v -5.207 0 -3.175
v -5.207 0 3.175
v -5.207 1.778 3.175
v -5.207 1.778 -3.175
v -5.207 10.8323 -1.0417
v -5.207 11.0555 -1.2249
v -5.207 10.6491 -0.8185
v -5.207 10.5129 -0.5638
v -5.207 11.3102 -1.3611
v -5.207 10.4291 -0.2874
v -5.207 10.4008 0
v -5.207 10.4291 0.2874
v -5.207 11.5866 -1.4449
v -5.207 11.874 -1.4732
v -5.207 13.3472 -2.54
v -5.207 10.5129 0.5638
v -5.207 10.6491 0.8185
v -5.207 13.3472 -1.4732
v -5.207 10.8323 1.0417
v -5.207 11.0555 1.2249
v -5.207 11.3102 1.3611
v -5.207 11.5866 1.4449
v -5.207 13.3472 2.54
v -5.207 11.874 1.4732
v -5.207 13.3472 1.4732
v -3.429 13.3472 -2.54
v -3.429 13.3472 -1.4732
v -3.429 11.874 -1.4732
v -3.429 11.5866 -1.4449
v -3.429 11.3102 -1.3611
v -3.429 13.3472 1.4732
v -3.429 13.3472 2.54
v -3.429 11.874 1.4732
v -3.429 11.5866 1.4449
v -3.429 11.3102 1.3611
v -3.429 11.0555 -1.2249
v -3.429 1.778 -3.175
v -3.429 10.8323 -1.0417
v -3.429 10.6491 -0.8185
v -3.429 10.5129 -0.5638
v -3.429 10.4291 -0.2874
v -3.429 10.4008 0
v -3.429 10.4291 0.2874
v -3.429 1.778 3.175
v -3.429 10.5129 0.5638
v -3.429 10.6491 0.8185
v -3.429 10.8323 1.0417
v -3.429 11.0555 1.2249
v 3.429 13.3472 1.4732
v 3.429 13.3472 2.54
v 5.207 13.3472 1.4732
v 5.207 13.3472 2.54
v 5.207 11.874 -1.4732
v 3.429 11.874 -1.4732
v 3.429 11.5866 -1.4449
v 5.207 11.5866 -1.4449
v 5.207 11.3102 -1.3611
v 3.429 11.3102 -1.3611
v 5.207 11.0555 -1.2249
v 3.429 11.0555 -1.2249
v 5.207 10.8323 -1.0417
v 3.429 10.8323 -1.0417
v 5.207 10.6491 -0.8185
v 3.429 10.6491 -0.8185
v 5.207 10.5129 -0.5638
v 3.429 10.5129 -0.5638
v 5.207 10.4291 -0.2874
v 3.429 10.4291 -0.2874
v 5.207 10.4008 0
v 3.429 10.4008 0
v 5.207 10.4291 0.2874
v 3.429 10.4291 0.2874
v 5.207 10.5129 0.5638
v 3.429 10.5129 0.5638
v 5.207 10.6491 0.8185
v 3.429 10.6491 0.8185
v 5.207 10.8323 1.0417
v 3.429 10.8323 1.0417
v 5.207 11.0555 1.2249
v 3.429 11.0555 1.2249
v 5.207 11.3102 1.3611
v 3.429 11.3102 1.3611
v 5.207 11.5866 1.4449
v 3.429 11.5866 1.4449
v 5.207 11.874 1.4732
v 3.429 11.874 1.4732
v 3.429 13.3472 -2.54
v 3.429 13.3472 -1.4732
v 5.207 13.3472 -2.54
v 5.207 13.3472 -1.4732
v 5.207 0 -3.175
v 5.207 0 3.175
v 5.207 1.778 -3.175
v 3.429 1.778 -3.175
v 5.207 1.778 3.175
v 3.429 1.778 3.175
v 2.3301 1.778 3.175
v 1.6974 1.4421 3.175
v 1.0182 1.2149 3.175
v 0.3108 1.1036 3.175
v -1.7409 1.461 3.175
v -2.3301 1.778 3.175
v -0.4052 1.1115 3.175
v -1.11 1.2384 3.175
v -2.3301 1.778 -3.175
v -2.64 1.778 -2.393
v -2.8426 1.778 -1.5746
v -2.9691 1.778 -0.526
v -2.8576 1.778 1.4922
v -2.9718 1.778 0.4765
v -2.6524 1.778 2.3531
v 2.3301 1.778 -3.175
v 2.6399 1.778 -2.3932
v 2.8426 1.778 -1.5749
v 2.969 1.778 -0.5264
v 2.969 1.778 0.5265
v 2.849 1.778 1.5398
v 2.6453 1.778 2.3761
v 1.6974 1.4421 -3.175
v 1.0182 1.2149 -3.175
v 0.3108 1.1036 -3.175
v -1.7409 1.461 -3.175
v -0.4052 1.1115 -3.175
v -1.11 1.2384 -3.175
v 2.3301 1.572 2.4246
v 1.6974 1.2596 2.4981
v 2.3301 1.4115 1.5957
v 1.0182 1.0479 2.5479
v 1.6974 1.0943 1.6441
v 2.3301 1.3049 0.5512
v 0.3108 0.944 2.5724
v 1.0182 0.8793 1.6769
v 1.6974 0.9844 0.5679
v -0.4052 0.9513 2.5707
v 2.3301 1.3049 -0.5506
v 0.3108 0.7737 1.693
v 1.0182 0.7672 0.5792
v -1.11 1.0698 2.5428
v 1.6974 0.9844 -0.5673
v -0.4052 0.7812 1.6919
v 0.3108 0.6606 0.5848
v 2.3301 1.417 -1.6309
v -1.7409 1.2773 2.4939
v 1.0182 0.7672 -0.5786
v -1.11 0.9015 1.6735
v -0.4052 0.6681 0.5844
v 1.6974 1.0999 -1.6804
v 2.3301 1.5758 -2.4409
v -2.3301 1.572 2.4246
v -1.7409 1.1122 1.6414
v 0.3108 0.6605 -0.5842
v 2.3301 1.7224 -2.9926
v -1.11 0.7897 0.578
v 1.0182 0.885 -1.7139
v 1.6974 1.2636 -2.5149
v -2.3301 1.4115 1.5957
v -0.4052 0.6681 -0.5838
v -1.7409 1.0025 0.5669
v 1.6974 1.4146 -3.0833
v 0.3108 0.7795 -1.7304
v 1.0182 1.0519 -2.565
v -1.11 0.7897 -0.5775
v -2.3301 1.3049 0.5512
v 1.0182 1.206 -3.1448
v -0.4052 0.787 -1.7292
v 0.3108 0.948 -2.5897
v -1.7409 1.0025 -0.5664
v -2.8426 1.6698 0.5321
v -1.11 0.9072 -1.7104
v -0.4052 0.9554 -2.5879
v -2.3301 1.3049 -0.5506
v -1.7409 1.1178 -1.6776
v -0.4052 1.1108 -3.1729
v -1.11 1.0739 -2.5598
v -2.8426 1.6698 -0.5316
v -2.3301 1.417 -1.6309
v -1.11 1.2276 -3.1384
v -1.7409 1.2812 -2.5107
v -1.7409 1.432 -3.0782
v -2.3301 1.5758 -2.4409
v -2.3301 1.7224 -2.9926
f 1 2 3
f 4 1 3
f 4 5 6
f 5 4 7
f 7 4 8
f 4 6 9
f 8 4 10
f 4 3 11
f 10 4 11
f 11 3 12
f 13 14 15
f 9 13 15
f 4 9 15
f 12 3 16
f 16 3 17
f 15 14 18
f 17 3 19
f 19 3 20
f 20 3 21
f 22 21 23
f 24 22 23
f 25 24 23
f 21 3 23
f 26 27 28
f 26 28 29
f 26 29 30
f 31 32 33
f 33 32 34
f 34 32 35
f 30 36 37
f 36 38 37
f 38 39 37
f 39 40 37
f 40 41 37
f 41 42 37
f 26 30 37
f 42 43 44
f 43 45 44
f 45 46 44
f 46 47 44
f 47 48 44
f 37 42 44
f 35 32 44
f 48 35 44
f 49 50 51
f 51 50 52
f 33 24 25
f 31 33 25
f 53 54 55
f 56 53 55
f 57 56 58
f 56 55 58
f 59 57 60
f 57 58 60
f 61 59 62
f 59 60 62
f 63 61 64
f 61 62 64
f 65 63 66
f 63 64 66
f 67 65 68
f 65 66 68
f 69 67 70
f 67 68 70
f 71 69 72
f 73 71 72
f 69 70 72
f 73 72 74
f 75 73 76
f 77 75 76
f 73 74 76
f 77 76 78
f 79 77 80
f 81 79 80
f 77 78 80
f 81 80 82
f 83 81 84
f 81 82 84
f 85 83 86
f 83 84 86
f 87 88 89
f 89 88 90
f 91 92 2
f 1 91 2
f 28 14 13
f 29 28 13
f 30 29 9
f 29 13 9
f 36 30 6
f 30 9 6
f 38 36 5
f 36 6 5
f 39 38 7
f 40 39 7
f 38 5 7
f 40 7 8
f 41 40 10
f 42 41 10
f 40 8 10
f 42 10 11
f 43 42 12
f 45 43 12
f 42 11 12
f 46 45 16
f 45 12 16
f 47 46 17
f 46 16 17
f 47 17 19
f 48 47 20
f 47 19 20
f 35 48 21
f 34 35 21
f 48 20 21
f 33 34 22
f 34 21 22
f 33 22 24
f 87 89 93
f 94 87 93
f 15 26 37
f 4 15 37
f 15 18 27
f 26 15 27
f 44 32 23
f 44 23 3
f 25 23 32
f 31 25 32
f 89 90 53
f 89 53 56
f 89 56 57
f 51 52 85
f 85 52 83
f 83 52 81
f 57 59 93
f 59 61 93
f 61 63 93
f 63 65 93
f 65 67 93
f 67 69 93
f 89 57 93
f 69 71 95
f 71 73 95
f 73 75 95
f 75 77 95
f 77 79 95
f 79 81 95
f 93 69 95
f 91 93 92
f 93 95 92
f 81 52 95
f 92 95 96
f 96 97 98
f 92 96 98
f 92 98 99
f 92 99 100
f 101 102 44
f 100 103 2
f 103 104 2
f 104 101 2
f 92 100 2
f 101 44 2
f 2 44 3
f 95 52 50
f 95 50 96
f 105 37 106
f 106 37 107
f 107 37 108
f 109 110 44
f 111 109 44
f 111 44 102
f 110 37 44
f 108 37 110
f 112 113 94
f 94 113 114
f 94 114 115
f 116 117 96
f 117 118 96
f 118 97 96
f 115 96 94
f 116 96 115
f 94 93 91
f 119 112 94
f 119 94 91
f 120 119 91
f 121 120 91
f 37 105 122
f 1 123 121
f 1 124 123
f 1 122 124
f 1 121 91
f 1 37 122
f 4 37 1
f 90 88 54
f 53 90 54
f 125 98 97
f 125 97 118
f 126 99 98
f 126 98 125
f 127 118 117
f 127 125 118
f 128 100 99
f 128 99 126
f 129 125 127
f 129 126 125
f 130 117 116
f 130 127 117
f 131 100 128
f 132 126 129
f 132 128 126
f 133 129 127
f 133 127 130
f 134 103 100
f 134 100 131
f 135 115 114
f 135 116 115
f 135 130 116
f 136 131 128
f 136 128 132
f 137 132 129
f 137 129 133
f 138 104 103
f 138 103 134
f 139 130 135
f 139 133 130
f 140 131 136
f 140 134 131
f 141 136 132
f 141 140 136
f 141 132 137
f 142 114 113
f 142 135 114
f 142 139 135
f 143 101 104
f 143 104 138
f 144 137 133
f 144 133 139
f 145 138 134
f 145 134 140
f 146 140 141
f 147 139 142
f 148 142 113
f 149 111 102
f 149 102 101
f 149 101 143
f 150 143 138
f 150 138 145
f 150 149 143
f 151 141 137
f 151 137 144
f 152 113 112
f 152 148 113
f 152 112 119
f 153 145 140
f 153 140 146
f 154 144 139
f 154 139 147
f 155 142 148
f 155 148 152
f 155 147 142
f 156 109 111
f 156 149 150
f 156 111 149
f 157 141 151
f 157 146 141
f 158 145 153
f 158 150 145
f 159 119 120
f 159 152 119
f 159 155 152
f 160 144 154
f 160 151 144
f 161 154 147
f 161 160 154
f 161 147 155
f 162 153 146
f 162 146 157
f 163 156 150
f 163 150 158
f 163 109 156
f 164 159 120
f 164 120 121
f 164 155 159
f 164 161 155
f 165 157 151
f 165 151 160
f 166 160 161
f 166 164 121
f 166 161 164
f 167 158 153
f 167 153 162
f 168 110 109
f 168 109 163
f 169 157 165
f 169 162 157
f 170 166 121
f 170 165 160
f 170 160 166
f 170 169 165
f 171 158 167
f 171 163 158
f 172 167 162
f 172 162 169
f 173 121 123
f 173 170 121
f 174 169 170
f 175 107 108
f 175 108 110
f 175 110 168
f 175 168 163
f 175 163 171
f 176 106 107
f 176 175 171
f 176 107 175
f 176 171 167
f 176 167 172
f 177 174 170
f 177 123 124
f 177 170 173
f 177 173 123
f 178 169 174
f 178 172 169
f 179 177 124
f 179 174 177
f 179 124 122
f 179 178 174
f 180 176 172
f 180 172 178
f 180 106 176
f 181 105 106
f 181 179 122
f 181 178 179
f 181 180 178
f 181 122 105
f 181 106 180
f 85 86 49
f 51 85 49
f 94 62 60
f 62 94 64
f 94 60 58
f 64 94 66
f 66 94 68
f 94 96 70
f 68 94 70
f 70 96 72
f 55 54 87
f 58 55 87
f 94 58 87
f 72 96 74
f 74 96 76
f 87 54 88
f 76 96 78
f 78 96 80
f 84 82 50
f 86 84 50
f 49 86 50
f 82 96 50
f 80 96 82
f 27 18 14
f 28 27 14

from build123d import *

# Parameters (mm, degrees)
BOSS_EXTRUDE1_DEPTH     = 3.175
CUT_EXTRUDE1_DEPTH      = 15.674509254
CUT_EXTRUDE1_DEPTH_BACK = 15.674509254
CUT_EXTRUDE2_DEPTH      = 15.674509254


with BuildPart() as part:
    # Sketch1 → Boss-Extrude1 (new, symmetric)
    with BuildSketch(Plane.XY):
        Polygon((5.207, 0), (-5.207, 0), (-5.207, 13.3472), (-3.429, 13.3472), (-3.429, 1.778), (3.429, 1.778), (3.429, 13.3472), (5.207, 13.3472), align=None)
    extrude(amount=BOSS_EXTRUDE1_DEPTH, both=True)

    # Sketch2 → Cut-Extrude1 (cut, two sides: drawn at the far end of the back side and taken through both)
    with BuildSketch(Plane(origin=(0, 0, 0), x_dir=(0, 0, -1), z_dir=(1, 0, 0)).offset(-CUT_EXTRUDE1_DEPTH_BACK)):
        with BuildLine():
            Line((1.4732, 13.3472), (1.4732, 11.874))
            ThreePointArc((1.4732, 11.874), (0, 10.4008), (-1.4732, 11.874))
            Line((-1.4732, 11.874), (-1.4732, 13.3472))
            ThreePointArc((-1.4732, 13.3472), (0, 14.8204), (1.4732, 13.3472))
        make_face()
    extrude(amount=CUT_EXTRUDE1_DEPTH + CUT_EXTRUDE1_DEPTH_BACK, mode=Mode.SUBTRACT)

    # Sketch4 → Cut-Extrude2 (cut, symmetric)
    with BuildSketch(Plane(origin=(0, 0, 0), x_dir=(0, 0, -1), z_dir=(1, 0, 0))):
        Polygon((-3.175, 1.778), (-3.175, 13.3472), (-2.54, 13.3472), align=None)
    cut_extrude2 = extrude(amount=CUT_EXTRUDE2_DEPTH, both=True, mode=Mode.SUBTRACT)

    # Mirror1: Cut-Extrude2 across plane
    add(cut_extrude2.mirror(Plane.XY), mode=Mode.SUBTRACT)

    # Sketch3 → Cut-Revolve1 (revolve, cut)
    with BuildSketch(Plane.XY):
        with BuildLine():
            Line((-3.11999347, 1.905), (3.11999347, 1.905))
            ThreePointArc((3.11999347, 1.905), (0, 0.6345), (-3.11999347, 1.905))
        make_face()
    revolve(axis=Axis((0, 11.874, 0), (1, 0, 0)), mode=Mode.SUBTRACT)


solid = part.part
